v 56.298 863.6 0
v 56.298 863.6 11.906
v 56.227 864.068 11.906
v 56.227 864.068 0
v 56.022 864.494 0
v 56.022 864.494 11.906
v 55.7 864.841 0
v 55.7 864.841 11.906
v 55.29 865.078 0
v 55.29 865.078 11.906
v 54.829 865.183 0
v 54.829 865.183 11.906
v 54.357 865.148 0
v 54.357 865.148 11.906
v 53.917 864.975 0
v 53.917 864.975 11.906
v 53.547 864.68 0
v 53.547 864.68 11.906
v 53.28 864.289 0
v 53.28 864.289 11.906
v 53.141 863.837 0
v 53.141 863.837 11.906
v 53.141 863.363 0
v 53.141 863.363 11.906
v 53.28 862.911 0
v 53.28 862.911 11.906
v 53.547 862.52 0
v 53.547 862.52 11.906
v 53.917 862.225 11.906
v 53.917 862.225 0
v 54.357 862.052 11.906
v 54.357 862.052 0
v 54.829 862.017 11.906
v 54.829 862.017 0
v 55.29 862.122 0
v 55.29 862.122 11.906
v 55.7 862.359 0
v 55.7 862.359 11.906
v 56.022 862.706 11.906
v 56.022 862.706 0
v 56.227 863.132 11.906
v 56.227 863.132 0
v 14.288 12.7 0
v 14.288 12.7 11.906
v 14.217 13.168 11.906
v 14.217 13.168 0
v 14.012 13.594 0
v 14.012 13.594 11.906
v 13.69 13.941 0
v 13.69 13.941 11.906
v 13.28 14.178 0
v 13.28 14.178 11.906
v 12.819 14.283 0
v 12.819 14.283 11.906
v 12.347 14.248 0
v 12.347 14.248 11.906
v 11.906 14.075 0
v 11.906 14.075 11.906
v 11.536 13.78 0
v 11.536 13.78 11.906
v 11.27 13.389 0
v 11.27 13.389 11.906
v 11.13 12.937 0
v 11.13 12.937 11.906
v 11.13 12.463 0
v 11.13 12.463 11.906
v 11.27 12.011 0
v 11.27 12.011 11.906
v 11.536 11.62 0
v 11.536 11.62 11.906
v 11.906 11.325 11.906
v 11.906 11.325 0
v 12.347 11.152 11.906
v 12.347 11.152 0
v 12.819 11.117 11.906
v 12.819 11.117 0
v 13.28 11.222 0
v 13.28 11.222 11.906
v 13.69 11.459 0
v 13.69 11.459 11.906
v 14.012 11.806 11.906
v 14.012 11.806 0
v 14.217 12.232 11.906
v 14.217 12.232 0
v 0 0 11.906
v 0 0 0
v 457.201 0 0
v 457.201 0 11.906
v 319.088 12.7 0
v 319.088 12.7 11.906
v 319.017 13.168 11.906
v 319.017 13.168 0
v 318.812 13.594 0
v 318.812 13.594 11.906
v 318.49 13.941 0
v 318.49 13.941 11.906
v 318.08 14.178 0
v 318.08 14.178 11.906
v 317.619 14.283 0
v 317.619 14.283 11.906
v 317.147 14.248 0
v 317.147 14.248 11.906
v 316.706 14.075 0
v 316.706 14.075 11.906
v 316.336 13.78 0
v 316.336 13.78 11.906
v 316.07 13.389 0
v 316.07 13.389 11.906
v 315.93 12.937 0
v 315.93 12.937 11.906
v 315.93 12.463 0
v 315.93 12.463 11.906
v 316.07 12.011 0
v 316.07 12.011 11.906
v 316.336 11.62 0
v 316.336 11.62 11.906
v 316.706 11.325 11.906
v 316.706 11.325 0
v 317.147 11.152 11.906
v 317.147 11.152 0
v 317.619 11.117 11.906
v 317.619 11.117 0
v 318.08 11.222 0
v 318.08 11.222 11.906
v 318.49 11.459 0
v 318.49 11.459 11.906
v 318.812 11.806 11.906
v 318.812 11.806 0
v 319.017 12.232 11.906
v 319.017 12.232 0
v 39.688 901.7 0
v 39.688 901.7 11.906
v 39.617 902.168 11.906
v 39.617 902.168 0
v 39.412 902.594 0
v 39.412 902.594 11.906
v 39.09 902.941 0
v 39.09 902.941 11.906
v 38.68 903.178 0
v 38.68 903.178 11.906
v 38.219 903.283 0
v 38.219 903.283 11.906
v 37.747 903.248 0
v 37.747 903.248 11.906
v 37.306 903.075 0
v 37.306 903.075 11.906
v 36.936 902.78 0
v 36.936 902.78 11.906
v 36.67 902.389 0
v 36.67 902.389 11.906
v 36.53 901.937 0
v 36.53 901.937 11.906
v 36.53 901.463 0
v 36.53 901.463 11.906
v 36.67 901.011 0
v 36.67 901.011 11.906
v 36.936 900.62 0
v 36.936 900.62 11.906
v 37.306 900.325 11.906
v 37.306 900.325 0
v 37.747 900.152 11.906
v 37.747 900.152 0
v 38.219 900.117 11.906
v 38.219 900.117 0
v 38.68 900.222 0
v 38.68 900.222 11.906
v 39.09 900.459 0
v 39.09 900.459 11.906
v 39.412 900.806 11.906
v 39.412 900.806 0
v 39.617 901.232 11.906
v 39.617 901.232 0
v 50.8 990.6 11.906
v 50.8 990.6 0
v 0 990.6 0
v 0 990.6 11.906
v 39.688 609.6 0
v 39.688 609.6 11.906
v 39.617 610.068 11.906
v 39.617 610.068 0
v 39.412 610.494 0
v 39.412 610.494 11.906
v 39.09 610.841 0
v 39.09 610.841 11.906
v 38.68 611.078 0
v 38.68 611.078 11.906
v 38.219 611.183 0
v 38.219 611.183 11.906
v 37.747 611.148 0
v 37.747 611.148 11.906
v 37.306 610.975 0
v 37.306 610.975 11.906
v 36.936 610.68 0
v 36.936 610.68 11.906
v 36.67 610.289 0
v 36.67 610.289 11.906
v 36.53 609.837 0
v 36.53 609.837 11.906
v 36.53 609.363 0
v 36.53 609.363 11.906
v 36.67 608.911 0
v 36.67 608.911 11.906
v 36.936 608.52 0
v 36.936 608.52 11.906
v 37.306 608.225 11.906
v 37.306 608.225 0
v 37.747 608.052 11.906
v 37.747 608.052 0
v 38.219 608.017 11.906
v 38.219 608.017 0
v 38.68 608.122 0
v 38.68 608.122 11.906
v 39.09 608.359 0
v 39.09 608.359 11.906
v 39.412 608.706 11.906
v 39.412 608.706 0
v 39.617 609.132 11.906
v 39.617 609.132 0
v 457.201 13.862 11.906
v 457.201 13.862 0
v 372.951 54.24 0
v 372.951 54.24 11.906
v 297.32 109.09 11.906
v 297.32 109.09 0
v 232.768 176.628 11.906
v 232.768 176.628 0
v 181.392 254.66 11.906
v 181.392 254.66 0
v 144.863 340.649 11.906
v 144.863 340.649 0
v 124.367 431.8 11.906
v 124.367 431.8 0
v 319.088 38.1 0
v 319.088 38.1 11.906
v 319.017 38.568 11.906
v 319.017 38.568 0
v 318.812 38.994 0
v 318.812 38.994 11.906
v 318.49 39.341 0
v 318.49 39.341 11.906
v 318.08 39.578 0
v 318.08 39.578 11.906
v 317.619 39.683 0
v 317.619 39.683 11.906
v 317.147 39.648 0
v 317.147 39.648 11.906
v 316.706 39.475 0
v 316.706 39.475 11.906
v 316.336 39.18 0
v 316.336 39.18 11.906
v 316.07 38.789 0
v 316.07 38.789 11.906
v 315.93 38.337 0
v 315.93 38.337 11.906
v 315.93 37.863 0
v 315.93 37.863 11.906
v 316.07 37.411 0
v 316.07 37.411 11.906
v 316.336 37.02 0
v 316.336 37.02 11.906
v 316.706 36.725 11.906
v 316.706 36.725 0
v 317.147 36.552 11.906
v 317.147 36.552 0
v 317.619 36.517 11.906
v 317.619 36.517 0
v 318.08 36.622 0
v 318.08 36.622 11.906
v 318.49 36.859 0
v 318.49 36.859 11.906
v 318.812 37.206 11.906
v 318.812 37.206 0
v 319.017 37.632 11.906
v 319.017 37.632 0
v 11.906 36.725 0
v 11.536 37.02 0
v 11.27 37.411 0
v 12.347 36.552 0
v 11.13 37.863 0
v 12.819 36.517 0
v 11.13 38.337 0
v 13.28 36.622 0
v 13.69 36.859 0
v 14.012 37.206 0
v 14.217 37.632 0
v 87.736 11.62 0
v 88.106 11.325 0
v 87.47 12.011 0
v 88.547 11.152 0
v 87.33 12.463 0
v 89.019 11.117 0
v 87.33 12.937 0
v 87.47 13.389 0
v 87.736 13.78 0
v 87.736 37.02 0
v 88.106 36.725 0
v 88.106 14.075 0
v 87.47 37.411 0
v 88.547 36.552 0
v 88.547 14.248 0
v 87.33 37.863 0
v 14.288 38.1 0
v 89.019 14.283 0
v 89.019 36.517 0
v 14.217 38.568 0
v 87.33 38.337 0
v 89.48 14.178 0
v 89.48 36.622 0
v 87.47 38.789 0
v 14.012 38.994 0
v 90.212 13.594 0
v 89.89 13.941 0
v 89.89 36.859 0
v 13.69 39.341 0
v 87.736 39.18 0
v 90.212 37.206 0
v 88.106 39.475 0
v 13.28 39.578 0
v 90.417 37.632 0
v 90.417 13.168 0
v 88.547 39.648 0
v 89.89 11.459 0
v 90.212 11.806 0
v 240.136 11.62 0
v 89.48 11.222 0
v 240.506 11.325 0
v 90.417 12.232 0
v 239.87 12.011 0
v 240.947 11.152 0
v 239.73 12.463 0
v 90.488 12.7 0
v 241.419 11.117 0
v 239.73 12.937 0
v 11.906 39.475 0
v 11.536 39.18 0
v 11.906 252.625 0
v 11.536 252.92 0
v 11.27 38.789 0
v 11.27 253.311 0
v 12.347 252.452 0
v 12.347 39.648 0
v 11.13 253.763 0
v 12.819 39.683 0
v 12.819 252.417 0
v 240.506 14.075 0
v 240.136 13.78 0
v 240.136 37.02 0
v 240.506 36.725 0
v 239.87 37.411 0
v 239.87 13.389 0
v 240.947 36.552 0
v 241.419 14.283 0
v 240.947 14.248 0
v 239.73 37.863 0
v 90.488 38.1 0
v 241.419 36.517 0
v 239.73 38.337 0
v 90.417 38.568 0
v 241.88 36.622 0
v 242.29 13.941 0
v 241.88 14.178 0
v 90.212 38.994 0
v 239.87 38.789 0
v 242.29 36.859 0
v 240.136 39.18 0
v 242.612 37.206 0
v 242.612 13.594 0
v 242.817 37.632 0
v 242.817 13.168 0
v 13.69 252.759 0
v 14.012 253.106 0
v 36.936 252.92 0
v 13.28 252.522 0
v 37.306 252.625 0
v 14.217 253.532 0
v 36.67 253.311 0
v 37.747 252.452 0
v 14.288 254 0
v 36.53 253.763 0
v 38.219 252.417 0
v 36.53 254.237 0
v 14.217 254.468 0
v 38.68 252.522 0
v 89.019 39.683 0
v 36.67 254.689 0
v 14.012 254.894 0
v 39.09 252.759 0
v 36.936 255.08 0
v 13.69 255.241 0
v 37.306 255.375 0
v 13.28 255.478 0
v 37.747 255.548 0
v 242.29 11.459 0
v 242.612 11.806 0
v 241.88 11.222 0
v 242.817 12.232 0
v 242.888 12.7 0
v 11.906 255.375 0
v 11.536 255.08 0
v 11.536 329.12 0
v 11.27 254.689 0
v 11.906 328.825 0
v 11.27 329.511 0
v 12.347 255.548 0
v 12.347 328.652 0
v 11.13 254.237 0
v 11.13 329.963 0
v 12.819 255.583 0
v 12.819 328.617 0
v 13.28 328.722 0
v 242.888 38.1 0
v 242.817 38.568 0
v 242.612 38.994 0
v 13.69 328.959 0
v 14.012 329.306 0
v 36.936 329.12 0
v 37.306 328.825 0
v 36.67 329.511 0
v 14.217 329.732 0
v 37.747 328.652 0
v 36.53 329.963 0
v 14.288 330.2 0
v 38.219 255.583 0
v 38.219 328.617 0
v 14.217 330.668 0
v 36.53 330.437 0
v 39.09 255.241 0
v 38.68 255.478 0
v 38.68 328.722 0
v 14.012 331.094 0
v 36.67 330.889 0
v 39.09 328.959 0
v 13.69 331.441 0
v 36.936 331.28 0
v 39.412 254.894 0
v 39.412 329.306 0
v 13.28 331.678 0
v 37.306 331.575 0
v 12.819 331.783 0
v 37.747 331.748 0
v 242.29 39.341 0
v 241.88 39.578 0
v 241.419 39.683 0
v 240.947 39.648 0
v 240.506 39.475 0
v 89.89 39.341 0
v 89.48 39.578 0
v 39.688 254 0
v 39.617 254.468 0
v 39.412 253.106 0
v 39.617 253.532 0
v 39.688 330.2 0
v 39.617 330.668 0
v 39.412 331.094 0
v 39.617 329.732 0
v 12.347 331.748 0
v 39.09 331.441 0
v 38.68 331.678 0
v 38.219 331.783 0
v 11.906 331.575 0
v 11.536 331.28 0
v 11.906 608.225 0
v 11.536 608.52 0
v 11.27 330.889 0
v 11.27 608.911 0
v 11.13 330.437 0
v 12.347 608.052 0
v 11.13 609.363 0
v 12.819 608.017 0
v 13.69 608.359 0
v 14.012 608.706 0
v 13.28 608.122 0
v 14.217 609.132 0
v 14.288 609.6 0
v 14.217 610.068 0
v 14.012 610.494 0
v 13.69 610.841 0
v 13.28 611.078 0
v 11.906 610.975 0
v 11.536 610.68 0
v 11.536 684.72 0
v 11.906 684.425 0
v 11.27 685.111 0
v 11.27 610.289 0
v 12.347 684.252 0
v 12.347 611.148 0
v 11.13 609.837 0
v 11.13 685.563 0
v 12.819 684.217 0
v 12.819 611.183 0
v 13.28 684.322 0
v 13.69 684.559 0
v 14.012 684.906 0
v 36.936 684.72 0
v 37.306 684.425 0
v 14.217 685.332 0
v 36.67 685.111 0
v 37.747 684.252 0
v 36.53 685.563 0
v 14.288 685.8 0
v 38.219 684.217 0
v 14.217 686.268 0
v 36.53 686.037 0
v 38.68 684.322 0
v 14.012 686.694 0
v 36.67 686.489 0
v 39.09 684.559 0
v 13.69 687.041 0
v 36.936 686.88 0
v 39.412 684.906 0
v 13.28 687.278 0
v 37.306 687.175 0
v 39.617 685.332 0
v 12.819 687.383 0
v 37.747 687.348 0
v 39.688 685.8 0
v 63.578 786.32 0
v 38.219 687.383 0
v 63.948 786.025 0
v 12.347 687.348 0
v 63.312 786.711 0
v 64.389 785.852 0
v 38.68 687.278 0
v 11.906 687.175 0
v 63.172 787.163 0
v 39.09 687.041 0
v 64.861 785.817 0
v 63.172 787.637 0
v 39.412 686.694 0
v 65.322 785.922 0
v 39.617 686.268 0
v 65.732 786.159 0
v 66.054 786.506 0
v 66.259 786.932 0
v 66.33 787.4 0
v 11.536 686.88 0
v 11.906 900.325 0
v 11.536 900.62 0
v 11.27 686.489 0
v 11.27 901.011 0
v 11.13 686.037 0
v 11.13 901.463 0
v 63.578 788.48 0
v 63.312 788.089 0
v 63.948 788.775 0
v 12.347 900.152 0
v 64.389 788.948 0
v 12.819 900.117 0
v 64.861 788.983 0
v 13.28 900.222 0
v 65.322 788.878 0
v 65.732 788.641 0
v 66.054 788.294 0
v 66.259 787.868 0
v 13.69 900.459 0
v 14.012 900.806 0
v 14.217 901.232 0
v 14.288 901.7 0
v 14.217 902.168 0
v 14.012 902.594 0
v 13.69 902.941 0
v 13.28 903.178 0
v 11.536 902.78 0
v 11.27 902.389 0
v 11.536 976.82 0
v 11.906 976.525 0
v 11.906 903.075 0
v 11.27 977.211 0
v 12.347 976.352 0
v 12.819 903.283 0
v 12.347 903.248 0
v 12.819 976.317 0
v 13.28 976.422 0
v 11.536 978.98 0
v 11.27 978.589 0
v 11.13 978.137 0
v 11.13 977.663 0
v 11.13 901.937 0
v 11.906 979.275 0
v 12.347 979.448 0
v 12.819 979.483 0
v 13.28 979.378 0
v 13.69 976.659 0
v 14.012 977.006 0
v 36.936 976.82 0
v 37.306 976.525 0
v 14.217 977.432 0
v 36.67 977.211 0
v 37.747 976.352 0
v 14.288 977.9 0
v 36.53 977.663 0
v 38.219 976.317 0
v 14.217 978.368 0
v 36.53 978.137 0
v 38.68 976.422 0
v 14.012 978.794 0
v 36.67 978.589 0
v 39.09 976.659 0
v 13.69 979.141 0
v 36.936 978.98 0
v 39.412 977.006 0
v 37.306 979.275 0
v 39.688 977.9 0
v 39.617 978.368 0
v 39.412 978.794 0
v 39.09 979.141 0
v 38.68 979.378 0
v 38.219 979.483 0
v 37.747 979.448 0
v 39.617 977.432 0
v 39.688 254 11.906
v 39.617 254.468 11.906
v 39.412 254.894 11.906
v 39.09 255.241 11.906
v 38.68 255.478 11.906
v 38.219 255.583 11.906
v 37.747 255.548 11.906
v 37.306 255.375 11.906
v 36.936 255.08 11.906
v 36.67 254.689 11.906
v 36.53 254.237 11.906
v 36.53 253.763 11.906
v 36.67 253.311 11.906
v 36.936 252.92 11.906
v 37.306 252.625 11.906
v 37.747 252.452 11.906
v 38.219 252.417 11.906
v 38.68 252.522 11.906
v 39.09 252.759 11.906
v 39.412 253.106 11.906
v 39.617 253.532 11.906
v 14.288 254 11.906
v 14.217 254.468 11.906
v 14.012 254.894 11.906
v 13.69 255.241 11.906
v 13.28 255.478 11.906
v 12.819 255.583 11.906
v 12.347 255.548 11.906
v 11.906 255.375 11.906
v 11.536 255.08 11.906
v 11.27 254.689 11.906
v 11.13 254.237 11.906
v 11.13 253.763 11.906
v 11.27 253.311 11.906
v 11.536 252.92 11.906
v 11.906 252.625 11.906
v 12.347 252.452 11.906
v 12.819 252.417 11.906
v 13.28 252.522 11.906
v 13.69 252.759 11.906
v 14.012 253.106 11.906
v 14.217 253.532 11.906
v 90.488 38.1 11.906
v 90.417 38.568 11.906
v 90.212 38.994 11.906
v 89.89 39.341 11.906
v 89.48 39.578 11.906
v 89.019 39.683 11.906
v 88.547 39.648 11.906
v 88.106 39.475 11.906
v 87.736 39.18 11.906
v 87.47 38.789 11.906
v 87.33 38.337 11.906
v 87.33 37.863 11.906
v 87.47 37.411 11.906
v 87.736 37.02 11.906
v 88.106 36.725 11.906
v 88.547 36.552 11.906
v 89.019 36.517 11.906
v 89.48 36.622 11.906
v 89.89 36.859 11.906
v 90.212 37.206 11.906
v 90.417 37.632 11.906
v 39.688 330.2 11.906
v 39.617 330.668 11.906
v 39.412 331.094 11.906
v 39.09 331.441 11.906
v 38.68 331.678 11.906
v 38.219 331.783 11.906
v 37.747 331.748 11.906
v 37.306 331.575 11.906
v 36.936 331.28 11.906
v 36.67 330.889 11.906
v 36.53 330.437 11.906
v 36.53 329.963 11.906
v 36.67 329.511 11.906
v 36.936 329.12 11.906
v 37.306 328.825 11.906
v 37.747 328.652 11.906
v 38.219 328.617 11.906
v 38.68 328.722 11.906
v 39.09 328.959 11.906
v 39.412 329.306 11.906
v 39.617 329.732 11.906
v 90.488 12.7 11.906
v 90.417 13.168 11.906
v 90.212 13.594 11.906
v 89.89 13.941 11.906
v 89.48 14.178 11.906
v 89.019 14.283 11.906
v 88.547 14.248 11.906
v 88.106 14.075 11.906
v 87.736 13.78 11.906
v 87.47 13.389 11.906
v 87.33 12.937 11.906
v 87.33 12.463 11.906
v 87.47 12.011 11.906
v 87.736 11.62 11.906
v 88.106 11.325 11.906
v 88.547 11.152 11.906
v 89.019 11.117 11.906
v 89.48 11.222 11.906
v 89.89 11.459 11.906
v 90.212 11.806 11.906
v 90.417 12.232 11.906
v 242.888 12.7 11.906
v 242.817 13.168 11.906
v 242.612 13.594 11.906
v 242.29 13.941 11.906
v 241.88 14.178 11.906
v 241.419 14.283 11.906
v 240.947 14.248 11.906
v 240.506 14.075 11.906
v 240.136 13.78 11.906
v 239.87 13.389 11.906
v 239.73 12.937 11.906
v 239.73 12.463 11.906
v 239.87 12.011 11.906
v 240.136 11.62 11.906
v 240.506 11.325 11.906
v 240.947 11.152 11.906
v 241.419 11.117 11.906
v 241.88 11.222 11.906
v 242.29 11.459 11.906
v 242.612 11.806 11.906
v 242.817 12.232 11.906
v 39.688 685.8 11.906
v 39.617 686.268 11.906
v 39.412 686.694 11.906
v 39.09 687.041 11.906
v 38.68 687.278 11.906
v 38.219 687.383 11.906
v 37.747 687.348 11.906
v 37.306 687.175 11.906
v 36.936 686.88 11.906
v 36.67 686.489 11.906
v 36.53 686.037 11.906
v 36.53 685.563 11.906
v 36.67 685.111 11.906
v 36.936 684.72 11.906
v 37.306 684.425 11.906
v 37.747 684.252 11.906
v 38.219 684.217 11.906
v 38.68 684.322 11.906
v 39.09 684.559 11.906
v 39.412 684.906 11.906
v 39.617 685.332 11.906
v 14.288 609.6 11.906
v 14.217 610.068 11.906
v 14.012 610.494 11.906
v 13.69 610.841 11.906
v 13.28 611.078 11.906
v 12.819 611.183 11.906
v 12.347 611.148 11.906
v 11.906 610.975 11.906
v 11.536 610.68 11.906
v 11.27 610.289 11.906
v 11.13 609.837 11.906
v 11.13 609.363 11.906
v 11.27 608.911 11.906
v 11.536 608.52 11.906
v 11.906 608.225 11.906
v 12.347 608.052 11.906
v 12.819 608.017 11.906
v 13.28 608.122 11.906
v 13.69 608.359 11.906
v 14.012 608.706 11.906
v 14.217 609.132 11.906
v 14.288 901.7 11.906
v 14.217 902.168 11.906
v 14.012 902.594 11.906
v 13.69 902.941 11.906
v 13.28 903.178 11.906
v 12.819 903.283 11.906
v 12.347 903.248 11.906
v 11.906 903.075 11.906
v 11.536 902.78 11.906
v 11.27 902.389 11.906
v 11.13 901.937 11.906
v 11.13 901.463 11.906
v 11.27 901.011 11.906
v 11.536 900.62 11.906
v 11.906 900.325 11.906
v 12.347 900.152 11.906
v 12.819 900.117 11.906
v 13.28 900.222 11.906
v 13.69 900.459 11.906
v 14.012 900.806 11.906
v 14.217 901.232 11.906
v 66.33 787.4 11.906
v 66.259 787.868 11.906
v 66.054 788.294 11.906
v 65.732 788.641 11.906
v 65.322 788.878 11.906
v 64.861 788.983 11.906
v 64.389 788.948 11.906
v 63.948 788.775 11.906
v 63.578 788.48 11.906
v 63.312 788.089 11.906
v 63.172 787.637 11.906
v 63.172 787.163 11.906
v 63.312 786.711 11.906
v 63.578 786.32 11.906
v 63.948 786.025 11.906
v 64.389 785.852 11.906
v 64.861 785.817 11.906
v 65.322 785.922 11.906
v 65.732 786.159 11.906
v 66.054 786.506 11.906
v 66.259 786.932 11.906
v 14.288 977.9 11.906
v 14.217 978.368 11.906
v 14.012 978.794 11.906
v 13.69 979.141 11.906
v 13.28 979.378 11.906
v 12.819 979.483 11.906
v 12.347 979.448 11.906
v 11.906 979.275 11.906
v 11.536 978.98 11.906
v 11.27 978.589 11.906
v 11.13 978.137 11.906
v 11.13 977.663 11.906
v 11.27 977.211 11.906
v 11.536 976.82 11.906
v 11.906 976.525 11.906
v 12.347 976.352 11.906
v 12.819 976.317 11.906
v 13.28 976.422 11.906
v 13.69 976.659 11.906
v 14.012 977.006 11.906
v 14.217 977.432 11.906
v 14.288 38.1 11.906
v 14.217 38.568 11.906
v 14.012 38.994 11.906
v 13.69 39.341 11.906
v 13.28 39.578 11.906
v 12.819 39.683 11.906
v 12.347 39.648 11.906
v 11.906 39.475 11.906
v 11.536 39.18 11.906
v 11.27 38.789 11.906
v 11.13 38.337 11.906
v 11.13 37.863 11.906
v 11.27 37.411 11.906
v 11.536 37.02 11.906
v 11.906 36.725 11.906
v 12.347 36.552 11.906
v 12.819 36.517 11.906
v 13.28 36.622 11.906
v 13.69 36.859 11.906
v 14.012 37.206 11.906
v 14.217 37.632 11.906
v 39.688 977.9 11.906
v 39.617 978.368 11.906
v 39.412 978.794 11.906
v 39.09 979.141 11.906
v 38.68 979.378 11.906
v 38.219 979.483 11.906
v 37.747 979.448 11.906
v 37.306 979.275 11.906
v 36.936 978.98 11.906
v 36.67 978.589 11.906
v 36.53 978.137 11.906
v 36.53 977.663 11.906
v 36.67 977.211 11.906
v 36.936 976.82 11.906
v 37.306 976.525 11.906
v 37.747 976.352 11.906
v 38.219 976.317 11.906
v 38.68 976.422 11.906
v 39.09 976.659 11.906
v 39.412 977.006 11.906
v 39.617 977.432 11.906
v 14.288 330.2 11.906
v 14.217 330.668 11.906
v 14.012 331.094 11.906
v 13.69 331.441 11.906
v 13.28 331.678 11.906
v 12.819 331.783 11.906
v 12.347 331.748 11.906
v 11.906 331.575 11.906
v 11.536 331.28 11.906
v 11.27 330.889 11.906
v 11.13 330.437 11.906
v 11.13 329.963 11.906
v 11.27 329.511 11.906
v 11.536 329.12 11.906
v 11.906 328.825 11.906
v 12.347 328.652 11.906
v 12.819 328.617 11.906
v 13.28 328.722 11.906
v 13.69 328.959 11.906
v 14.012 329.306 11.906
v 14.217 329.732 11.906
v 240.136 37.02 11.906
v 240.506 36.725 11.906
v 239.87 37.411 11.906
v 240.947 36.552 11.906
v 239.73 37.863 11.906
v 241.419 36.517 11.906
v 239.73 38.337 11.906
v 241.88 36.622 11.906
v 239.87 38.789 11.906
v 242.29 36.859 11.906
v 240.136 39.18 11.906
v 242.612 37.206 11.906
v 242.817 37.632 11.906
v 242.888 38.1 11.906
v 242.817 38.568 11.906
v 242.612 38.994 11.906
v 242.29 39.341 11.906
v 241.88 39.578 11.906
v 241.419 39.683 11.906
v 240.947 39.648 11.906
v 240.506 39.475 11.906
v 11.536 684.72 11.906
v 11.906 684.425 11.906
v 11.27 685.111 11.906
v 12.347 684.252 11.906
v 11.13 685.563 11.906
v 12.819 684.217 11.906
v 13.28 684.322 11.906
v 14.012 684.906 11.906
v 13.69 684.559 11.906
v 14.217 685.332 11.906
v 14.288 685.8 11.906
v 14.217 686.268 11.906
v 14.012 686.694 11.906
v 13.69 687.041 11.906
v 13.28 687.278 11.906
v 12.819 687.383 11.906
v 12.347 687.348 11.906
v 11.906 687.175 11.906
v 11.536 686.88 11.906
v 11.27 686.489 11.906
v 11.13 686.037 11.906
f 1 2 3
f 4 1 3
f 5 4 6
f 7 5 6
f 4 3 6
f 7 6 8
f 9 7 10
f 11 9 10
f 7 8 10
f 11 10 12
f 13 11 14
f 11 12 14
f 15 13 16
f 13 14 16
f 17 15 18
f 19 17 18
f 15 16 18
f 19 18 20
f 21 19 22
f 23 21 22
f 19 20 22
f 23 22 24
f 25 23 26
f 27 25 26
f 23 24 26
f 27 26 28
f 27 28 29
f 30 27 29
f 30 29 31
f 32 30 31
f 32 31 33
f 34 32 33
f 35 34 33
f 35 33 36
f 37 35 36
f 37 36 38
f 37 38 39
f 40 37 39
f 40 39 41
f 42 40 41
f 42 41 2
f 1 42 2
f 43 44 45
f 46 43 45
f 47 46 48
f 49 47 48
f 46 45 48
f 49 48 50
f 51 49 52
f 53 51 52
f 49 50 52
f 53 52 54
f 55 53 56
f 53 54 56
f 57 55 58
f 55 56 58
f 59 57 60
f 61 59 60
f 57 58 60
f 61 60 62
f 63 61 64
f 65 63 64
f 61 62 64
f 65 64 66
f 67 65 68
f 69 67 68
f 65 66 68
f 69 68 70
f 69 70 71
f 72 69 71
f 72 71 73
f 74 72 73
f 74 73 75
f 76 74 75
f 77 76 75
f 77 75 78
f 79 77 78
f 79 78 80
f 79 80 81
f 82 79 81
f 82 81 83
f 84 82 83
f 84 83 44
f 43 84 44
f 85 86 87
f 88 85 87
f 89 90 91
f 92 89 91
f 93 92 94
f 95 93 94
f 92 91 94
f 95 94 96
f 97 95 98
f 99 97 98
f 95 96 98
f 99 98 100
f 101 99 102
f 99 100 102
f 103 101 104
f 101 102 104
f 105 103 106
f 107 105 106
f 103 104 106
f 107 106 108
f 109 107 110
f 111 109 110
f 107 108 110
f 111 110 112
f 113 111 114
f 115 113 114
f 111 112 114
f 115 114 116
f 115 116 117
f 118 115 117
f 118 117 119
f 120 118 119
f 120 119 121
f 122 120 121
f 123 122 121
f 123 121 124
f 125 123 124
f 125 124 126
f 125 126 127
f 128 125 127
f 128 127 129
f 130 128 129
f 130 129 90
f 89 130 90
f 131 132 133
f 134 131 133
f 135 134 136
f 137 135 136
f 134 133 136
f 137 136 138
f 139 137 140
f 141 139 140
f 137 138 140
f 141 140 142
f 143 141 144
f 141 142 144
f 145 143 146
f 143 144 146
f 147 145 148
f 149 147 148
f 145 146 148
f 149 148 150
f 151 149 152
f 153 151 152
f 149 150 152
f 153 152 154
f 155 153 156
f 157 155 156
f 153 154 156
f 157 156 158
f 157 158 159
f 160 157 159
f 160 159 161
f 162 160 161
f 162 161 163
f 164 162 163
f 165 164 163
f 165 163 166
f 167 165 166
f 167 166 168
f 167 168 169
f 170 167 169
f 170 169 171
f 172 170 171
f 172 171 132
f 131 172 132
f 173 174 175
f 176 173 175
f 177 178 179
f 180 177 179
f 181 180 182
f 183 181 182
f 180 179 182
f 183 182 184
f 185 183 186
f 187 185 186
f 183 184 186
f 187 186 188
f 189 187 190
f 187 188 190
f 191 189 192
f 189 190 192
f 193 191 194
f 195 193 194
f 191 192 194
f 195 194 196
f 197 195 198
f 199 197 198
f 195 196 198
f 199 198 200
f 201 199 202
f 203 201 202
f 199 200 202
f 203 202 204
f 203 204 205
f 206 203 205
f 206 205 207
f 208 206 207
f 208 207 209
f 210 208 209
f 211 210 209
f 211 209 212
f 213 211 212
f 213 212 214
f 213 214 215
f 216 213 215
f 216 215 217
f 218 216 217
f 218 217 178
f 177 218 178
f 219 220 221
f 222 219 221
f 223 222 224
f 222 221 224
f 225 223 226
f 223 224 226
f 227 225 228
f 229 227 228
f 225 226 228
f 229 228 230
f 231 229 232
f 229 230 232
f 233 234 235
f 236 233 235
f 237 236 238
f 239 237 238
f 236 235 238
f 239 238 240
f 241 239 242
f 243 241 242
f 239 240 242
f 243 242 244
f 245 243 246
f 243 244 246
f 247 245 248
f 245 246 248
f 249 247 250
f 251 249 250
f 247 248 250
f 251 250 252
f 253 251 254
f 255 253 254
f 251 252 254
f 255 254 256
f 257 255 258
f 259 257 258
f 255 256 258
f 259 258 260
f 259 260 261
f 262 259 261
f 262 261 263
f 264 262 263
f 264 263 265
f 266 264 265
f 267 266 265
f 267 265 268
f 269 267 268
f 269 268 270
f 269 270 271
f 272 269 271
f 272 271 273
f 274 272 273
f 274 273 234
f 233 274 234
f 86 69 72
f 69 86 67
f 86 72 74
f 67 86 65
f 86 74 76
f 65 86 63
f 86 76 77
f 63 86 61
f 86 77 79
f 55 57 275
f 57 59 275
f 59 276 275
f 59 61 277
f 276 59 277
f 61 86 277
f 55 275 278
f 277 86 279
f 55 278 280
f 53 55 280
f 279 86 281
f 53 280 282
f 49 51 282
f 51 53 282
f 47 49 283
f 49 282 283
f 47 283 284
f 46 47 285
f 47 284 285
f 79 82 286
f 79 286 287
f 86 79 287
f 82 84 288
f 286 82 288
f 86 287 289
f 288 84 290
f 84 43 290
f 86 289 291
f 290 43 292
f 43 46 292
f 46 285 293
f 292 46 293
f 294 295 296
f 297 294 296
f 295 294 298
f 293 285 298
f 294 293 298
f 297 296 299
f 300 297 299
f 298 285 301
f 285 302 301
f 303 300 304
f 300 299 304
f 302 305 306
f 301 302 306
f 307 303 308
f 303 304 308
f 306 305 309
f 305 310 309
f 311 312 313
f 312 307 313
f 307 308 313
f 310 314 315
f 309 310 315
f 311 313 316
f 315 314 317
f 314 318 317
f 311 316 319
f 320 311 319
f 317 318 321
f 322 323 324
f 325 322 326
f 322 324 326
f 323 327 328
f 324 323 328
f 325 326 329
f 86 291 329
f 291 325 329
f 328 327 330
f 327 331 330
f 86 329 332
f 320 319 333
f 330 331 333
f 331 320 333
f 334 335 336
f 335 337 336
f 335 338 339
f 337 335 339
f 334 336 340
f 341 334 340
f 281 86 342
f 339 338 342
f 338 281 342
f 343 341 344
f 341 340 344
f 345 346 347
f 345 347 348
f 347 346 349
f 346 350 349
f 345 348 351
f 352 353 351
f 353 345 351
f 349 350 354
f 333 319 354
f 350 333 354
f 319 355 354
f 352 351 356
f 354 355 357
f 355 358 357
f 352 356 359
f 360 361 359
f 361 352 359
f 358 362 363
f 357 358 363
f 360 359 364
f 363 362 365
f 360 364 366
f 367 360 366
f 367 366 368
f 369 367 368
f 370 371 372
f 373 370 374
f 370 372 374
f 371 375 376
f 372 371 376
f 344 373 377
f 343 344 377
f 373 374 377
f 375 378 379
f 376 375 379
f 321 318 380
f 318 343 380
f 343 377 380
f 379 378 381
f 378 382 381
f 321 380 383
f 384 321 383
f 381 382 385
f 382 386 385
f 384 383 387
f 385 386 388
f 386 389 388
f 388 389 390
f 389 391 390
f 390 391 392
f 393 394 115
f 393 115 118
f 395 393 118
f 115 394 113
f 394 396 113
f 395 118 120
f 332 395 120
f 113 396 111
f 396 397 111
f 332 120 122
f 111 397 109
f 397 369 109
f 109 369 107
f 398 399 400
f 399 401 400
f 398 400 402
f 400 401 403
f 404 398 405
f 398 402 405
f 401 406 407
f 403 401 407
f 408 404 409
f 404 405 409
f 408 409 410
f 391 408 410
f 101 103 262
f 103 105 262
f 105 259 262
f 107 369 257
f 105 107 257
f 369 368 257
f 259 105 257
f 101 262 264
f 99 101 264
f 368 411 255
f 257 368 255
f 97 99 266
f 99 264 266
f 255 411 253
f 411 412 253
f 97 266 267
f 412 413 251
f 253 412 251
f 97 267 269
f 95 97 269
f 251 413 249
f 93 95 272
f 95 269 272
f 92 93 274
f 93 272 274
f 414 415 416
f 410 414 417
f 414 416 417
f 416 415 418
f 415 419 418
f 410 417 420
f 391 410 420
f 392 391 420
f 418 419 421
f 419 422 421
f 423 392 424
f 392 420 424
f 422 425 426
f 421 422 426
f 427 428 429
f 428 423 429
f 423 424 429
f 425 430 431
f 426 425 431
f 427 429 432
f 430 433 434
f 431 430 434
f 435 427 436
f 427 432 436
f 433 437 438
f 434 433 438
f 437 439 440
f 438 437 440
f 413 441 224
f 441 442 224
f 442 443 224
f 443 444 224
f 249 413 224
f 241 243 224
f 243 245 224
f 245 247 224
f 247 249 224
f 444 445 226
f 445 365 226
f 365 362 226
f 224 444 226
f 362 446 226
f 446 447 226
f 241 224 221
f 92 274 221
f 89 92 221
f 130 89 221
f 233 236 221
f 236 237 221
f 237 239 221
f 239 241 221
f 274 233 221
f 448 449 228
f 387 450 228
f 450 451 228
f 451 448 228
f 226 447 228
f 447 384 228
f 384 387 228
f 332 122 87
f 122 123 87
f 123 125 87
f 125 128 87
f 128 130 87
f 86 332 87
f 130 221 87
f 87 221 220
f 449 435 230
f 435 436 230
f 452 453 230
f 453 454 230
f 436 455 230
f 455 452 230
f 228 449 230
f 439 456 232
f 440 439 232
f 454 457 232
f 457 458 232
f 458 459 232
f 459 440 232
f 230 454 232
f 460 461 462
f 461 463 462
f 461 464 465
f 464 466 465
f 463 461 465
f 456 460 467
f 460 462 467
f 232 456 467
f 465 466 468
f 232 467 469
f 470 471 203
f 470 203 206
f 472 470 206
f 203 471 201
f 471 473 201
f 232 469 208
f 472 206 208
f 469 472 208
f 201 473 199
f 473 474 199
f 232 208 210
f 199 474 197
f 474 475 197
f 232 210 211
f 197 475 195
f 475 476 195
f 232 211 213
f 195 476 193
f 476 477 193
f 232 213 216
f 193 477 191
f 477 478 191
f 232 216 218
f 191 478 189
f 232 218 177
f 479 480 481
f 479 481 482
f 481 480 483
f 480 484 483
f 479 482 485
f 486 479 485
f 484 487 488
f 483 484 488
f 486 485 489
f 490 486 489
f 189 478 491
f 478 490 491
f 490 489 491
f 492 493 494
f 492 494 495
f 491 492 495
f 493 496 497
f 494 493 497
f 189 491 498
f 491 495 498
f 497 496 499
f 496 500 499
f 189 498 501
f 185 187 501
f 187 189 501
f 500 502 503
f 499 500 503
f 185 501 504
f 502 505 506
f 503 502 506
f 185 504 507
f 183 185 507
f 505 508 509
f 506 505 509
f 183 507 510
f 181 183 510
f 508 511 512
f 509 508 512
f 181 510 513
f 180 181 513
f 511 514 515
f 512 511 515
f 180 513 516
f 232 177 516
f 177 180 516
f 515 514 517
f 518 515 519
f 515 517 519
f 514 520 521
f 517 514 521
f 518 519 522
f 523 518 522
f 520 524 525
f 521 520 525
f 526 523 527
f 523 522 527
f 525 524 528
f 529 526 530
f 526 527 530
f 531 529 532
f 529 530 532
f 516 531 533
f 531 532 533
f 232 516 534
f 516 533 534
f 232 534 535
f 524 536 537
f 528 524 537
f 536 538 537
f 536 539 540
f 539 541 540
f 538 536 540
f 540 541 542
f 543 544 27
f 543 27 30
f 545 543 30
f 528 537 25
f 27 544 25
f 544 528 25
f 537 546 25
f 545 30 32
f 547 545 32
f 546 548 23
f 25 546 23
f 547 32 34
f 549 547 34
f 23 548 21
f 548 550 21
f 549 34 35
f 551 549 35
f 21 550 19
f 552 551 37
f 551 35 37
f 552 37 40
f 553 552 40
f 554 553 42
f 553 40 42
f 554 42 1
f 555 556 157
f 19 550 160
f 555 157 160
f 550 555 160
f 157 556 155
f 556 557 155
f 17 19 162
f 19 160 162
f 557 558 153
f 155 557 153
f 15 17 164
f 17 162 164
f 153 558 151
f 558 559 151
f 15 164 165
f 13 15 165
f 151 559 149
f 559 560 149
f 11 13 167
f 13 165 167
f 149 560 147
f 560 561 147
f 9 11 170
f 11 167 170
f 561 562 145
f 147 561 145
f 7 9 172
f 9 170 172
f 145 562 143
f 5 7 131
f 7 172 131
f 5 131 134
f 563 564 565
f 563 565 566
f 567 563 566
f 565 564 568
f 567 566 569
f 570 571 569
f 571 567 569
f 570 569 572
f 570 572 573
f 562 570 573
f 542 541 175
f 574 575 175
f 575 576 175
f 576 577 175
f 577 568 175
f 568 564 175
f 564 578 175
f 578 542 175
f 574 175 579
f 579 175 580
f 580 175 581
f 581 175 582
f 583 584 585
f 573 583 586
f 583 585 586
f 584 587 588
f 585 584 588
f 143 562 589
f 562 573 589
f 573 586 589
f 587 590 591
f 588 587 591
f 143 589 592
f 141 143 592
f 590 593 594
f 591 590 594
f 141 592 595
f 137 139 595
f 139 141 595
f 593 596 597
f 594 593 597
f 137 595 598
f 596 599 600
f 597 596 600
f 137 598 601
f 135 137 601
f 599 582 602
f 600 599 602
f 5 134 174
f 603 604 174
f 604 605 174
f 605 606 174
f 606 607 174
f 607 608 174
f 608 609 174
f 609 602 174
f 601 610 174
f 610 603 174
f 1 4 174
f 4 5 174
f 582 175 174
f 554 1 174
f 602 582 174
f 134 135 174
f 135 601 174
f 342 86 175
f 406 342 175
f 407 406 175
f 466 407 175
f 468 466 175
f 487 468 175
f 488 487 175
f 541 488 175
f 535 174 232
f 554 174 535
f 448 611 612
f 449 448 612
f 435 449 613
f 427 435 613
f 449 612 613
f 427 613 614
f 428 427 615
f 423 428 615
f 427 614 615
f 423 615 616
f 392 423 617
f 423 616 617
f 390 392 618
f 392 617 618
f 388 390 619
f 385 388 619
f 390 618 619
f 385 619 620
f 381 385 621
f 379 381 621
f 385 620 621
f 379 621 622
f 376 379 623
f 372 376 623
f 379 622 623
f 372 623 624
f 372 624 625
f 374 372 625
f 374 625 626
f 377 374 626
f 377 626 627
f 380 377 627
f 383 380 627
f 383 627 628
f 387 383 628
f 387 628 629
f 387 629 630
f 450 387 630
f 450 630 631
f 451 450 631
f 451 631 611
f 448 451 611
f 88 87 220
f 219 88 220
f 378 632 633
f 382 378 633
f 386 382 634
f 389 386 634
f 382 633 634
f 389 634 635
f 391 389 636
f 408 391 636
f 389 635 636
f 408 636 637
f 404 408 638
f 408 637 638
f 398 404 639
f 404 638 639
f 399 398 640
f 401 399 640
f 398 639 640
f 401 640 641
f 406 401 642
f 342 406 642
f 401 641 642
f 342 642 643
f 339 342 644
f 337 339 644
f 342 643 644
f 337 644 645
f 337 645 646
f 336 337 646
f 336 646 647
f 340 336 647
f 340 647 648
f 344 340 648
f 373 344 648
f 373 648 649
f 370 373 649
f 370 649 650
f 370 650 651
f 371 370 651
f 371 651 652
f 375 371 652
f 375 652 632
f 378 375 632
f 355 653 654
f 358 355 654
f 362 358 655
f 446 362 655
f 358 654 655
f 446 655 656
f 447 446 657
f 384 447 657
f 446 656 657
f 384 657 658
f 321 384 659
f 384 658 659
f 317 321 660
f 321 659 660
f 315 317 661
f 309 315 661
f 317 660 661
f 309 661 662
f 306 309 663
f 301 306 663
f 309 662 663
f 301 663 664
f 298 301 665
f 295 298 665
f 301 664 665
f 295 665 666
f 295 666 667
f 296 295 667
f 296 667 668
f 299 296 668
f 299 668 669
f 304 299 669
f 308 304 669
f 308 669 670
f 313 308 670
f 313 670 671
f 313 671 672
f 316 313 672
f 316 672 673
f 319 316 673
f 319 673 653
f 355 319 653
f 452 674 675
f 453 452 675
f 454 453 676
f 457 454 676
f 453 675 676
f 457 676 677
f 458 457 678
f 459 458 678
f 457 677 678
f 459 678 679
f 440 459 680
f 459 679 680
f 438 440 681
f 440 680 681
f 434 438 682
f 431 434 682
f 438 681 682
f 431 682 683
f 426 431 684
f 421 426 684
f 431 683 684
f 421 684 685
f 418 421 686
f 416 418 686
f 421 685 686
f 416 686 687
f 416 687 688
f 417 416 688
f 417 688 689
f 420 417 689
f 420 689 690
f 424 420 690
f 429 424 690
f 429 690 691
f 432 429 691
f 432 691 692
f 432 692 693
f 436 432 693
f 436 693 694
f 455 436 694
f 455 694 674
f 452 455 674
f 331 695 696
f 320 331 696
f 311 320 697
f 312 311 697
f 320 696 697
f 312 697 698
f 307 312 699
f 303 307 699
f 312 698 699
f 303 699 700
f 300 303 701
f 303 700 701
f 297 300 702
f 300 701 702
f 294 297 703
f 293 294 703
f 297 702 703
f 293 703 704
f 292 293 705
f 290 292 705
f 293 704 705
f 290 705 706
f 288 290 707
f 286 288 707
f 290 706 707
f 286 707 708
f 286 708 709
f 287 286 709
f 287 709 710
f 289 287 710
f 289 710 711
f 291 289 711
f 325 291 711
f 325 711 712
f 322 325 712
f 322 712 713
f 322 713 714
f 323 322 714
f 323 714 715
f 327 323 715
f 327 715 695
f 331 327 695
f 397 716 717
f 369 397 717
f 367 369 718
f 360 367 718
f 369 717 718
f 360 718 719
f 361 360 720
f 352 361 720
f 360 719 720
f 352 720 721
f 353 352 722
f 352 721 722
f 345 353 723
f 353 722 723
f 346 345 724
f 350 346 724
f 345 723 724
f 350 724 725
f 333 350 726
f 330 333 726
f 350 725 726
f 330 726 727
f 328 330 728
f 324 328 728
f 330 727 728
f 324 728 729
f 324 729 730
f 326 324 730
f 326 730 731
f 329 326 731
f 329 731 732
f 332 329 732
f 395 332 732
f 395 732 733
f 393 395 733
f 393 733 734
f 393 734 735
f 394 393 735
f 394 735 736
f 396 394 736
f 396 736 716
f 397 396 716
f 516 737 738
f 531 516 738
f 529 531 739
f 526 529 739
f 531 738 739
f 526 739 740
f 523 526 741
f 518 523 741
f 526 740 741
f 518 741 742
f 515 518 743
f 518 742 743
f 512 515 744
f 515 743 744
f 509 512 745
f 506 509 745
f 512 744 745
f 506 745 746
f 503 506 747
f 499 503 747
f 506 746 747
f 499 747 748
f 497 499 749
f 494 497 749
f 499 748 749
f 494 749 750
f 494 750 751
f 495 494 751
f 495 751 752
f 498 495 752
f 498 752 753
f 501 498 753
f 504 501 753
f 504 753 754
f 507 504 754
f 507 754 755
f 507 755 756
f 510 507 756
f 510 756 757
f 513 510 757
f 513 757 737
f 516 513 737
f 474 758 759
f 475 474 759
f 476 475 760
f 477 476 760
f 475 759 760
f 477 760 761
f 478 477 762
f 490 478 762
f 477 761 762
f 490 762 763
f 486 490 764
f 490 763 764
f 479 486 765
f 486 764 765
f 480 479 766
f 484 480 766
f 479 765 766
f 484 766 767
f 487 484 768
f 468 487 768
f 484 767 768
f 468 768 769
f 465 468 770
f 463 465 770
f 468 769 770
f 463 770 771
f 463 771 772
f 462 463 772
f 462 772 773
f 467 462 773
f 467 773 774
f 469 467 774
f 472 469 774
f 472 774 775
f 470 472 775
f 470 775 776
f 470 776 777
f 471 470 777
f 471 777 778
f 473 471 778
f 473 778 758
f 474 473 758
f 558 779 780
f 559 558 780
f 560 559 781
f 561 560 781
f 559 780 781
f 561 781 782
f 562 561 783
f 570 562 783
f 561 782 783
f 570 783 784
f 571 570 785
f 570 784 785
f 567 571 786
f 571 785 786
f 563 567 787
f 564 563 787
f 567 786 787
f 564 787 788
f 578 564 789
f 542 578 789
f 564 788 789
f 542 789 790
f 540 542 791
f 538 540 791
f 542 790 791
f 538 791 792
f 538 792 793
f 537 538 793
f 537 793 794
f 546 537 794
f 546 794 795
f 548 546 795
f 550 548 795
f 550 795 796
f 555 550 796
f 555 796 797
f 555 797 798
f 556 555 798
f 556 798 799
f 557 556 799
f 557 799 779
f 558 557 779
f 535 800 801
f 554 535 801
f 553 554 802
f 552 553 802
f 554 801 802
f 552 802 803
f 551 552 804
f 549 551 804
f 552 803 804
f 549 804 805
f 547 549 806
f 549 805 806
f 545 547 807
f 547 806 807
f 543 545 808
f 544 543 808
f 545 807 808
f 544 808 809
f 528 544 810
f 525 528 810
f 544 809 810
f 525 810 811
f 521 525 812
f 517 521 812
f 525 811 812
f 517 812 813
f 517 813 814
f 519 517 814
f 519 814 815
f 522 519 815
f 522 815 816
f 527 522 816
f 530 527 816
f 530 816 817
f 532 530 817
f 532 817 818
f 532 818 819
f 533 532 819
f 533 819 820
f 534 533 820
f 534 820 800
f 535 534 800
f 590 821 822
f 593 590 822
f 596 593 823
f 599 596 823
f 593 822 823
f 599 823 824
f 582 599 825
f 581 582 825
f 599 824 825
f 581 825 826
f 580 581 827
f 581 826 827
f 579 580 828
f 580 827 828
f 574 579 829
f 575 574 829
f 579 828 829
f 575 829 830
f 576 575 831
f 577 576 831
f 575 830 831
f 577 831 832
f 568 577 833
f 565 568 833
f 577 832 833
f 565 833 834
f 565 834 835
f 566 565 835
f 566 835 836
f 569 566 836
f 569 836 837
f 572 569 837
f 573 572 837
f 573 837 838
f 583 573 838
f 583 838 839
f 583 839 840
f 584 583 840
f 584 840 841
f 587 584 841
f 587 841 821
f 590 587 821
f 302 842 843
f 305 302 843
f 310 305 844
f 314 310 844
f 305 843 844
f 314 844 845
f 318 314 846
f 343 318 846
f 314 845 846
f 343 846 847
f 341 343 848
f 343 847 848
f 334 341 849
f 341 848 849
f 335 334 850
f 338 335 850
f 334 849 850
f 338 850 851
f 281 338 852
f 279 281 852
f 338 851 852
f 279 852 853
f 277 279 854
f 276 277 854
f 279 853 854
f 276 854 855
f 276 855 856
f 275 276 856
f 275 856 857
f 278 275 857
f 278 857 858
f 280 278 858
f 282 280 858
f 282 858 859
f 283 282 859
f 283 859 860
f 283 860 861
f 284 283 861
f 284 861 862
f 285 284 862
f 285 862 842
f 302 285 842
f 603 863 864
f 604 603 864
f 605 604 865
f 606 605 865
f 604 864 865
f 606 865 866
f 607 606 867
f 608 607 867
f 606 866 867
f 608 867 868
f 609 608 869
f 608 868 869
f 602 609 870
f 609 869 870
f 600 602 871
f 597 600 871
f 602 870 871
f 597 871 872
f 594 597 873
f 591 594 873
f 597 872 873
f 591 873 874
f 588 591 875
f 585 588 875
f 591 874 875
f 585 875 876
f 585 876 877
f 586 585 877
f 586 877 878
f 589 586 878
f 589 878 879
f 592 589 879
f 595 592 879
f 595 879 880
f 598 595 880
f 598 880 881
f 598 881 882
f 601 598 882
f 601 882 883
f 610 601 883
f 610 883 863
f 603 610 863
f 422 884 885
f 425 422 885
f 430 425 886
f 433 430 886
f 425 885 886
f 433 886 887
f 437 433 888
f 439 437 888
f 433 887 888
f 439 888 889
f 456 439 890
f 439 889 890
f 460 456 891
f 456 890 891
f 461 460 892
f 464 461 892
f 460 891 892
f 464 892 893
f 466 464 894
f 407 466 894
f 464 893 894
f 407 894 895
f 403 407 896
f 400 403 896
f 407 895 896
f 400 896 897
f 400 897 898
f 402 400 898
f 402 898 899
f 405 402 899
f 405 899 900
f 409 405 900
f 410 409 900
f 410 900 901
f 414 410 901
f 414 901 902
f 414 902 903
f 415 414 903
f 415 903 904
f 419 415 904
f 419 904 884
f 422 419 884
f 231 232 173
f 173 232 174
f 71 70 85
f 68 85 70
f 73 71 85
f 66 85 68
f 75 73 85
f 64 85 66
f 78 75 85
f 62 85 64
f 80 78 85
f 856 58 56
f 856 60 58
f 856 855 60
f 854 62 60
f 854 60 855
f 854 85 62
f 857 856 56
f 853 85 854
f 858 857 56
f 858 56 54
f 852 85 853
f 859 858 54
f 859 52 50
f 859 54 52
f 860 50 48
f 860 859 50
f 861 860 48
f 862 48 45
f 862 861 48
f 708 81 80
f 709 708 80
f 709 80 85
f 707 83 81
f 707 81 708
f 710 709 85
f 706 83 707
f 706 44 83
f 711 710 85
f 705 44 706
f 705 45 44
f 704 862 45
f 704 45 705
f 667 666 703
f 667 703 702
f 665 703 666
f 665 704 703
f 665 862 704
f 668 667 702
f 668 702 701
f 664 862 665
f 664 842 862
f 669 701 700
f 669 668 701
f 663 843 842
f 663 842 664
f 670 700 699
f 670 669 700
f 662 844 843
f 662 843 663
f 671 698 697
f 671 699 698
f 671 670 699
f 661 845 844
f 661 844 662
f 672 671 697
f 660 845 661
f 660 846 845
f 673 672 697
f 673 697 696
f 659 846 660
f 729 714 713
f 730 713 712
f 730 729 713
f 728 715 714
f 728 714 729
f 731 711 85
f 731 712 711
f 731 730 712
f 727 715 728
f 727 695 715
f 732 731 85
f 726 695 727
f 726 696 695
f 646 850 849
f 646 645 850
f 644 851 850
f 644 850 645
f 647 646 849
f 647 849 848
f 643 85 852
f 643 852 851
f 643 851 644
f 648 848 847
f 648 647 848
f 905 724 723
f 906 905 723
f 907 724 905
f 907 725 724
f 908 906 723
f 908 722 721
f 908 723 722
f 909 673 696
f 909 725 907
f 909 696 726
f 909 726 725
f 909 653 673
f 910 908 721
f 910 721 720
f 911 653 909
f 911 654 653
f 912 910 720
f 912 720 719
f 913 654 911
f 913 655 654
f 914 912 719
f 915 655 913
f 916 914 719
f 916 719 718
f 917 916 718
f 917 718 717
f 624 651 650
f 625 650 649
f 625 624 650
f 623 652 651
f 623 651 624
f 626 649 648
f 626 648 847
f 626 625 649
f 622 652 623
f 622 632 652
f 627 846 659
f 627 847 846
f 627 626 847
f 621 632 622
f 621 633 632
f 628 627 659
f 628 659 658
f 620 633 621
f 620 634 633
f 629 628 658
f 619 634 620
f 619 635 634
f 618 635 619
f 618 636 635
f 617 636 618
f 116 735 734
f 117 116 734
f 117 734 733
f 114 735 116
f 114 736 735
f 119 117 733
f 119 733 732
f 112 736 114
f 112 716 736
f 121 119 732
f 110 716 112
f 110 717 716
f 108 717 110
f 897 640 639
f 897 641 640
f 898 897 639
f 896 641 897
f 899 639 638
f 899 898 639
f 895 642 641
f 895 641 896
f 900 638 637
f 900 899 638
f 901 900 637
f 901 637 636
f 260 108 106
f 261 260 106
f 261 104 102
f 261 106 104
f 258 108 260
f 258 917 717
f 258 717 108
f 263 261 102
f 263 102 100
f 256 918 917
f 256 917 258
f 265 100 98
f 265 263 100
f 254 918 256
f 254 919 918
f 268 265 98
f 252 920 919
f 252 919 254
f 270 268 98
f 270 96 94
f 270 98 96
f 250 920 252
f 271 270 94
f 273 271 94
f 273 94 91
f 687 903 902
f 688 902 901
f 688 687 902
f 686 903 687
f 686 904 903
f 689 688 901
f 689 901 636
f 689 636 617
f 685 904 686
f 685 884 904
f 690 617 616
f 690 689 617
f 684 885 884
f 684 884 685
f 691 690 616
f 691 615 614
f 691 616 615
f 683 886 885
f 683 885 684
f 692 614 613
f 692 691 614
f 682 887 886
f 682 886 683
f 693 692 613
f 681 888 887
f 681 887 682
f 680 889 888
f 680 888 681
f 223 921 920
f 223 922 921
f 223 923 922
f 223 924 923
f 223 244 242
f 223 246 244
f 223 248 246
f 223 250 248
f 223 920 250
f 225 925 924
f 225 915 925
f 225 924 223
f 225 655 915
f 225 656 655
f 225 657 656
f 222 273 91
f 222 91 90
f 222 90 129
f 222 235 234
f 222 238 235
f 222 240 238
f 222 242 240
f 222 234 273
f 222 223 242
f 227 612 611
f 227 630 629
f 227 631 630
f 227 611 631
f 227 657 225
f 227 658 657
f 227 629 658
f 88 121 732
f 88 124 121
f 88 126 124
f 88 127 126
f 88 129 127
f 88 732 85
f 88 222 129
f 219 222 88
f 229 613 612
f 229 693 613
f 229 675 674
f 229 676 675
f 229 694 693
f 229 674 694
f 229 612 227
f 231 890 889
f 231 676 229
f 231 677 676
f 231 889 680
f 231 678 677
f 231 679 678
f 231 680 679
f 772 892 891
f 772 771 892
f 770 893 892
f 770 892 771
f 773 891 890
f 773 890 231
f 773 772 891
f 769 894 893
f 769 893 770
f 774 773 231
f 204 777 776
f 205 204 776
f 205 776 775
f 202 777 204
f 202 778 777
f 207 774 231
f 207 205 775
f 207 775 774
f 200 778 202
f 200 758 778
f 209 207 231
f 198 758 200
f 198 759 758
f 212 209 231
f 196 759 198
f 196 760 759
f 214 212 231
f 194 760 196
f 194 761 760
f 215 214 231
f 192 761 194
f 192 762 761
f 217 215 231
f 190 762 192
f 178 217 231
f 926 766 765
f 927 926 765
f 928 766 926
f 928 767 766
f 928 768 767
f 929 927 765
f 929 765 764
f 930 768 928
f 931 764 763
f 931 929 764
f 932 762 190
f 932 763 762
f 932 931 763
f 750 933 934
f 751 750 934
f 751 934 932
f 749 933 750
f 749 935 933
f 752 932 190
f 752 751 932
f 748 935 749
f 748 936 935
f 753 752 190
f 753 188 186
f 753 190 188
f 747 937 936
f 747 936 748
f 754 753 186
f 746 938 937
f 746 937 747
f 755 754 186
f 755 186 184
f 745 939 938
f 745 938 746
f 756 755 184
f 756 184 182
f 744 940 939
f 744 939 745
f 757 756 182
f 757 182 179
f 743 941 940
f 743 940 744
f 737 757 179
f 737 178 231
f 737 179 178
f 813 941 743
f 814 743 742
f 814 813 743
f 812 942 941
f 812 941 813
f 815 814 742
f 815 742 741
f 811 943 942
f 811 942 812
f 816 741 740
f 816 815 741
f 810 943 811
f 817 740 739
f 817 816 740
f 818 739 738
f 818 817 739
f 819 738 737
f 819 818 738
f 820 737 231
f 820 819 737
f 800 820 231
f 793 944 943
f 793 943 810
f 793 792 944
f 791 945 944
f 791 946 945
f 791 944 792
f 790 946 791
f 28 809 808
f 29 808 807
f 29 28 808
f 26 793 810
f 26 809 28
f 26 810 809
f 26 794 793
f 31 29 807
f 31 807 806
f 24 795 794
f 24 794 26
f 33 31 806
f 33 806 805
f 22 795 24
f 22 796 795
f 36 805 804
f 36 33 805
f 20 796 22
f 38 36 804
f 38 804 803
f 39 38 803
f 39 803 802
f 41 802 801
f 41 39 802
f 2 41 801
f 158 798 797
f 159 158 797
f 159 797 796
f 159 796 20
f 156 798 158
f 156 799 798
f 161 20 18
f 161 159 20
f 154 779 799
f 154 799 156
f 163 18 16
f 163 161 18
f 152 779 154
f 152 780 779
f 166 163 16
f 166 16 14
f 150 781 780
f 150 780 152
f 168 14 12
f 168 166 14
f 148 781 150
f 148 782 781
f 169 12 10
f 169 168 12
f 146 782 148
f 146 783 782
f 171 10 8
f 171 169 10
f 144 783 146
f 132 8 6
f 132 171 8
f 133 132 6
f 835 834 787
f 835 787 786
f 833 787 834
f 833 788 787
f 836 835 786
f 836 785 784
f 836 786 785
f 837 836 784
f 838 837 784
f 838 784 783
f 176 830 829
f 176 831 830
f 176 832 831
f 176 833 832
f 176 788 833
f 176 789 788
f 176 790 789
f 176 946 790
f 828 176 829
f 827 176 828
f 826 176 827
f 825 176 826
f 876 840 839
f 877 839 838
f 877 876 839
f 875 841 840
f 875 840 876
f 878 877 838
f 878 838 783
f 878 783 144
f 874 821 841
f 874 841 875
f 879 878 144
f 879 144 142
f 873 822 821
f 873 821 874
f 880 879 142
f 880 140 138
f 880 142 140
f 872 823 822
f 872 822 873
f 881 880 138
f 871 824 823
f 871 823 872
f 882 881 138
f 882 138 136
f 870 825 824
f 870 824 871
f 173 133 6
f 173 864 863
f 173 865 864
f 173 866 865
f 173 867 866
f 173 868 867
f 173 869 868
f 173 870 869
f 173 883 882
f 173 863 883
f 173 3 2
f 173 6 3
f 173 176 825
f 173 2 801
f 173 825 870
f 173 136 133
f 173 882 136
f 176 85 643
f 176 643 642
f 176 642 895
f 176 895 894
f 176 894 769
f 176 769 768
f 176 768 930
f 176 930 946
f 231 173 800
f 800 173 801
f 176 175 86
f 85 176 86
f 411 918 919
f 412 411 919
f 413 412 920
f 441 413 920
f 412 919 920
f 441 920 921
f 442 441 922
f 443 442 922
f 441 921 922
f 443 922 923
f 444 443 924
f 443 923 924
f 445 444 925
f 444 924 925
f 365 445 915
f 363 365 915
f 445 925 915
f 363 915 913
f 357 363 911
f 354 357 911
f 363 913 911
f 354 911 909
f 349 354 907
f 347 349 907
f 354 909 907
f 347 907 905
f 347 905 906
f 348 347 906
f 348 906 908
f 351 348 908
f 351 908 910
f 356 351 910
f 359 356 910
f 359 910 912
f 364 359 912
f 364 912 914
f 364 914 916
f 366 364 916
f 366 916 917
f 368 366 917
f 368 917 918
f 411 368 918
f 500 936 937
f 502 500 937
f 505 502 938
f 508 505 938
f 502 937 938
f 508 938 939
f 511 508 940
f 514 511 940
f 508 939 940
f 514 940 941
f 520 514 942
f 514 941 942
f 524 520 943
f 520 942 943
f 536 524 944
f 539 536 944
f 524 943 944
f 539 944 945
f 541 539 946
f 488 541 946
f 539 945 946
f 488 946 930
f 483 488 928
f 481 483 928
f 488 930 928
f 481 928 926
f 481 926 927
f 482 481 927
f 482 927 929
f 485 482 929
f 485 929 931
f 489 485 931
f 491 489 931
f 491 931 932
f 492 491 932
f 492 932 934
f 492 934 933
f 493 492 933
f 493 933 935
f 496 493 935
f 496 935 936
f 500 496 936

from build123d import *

# Parameters (mm, degrees)
BOSS_EXTRUDE1_DEPTH = 11.90625
SKETCH2_R           = 1.5875
CUT_EXTRUDE1_DEPTH  = 12.90625
SKETCH3_R           = 1.5875
CUT_EXTRUDE2_DEPTH  = 12.90625


with BuildPart() as part:
    # Sketch1 → Boss-Extrude1 (new body)
    with BuildSketch(Plane.XY):
        with BuildLine():
            Line((0, 990.6), (0, 0))
            Line((0, 0), (457.201, 0))
            Line((457.201, 0), (457.201, 13.862038208))
            ThreePointArc((457.201, 13.862038208), (232.767577124, 176.628269142), (124.367415652, 431.8))
            Line((124.367415652, 431.8), (50.8, 990.6))
            Line((50.8, 990.6), (0, 990.6))
        make_face()
    extrude(amount=BOSS_EXTRUDE1_DEPTH)

    # Sketch2 → Cut-Extrude1 (cut, through all)
    with BuildSketch(Plane.XY.offset(11.90625)):
        with Locations((12.7, 977.9)):
            Circle(SKETCH2_R)
        with Locations((38.1, 977.9)):
            Circle(SKETCH2_R)
        with Locations((12.7, 901.7)):
            Circle(SKETCH2_R)
        with Locations((38.1, 901.7)):
            Circle(SKETCH2_R)
        with Locations((12.7, 609.6)):
            Circle(SKETCH2_R)
        with Locations((38.1, 609.6)):
            Circle(SKETCH2_R)
        with Locations((12.7, 685.8)):
            Circle(SKETCH2_R)
        with Locations((38.1, 685.8)):
            Circle(SKETCH2_R)
        with Locations((12.7, 254)):
            Circle(SKETCH2_R)
        with Locations((38.1, 254)):
            Circle(SKETCH2_R)
        with Locations((12.7, 330.2)):
            Circle(SKETCH2_R)
        with Locations((38.1, 330.2)):
            Circle(SKETCH2_R)
        with Locations((12.7, 38.1)):
            Circle(SKETCH2_R)
        with Locations((12.7, 12.7)):
            Circle(SKETCH2_R)
        with Locations((88.9, 38.1)):
            Circle(SKETCH2_R)
        with Locations((88.9, 12.7)):
            Circle(SKETCH2_R)
        with Locations((241.3, 38.1)):
            Circle(SKETCH2_R)
        with Locations((317.5, 38.1)):
            Circle(SKETCH2_R)
        with Locations((241.3, 12.7)):
            Circle(SKETCH2_R)
        with Locations((317.5, 12.7)):
            Circle(SKETCH2_R)
    extrude(amount=-CUT_EXTRUDE1_DEPTH, mode=Mode.SUBTRACT)

    # Sketch3 → Cut-Extrude2 (cut, through all)
    with BuildSketch(Plane.XY.offset(11.90625)):
        with Locations((64.74219971, 787.4)):
            Circle(SKETCH3_R)
        with Locations((54.710279394, 863.6)):
            Circle(SKETCH3_R)
    extrude(amount=-CUT_EXTRUDE2_DEPTH, mode=Mode.SUBTRACT)


solid = part.part
